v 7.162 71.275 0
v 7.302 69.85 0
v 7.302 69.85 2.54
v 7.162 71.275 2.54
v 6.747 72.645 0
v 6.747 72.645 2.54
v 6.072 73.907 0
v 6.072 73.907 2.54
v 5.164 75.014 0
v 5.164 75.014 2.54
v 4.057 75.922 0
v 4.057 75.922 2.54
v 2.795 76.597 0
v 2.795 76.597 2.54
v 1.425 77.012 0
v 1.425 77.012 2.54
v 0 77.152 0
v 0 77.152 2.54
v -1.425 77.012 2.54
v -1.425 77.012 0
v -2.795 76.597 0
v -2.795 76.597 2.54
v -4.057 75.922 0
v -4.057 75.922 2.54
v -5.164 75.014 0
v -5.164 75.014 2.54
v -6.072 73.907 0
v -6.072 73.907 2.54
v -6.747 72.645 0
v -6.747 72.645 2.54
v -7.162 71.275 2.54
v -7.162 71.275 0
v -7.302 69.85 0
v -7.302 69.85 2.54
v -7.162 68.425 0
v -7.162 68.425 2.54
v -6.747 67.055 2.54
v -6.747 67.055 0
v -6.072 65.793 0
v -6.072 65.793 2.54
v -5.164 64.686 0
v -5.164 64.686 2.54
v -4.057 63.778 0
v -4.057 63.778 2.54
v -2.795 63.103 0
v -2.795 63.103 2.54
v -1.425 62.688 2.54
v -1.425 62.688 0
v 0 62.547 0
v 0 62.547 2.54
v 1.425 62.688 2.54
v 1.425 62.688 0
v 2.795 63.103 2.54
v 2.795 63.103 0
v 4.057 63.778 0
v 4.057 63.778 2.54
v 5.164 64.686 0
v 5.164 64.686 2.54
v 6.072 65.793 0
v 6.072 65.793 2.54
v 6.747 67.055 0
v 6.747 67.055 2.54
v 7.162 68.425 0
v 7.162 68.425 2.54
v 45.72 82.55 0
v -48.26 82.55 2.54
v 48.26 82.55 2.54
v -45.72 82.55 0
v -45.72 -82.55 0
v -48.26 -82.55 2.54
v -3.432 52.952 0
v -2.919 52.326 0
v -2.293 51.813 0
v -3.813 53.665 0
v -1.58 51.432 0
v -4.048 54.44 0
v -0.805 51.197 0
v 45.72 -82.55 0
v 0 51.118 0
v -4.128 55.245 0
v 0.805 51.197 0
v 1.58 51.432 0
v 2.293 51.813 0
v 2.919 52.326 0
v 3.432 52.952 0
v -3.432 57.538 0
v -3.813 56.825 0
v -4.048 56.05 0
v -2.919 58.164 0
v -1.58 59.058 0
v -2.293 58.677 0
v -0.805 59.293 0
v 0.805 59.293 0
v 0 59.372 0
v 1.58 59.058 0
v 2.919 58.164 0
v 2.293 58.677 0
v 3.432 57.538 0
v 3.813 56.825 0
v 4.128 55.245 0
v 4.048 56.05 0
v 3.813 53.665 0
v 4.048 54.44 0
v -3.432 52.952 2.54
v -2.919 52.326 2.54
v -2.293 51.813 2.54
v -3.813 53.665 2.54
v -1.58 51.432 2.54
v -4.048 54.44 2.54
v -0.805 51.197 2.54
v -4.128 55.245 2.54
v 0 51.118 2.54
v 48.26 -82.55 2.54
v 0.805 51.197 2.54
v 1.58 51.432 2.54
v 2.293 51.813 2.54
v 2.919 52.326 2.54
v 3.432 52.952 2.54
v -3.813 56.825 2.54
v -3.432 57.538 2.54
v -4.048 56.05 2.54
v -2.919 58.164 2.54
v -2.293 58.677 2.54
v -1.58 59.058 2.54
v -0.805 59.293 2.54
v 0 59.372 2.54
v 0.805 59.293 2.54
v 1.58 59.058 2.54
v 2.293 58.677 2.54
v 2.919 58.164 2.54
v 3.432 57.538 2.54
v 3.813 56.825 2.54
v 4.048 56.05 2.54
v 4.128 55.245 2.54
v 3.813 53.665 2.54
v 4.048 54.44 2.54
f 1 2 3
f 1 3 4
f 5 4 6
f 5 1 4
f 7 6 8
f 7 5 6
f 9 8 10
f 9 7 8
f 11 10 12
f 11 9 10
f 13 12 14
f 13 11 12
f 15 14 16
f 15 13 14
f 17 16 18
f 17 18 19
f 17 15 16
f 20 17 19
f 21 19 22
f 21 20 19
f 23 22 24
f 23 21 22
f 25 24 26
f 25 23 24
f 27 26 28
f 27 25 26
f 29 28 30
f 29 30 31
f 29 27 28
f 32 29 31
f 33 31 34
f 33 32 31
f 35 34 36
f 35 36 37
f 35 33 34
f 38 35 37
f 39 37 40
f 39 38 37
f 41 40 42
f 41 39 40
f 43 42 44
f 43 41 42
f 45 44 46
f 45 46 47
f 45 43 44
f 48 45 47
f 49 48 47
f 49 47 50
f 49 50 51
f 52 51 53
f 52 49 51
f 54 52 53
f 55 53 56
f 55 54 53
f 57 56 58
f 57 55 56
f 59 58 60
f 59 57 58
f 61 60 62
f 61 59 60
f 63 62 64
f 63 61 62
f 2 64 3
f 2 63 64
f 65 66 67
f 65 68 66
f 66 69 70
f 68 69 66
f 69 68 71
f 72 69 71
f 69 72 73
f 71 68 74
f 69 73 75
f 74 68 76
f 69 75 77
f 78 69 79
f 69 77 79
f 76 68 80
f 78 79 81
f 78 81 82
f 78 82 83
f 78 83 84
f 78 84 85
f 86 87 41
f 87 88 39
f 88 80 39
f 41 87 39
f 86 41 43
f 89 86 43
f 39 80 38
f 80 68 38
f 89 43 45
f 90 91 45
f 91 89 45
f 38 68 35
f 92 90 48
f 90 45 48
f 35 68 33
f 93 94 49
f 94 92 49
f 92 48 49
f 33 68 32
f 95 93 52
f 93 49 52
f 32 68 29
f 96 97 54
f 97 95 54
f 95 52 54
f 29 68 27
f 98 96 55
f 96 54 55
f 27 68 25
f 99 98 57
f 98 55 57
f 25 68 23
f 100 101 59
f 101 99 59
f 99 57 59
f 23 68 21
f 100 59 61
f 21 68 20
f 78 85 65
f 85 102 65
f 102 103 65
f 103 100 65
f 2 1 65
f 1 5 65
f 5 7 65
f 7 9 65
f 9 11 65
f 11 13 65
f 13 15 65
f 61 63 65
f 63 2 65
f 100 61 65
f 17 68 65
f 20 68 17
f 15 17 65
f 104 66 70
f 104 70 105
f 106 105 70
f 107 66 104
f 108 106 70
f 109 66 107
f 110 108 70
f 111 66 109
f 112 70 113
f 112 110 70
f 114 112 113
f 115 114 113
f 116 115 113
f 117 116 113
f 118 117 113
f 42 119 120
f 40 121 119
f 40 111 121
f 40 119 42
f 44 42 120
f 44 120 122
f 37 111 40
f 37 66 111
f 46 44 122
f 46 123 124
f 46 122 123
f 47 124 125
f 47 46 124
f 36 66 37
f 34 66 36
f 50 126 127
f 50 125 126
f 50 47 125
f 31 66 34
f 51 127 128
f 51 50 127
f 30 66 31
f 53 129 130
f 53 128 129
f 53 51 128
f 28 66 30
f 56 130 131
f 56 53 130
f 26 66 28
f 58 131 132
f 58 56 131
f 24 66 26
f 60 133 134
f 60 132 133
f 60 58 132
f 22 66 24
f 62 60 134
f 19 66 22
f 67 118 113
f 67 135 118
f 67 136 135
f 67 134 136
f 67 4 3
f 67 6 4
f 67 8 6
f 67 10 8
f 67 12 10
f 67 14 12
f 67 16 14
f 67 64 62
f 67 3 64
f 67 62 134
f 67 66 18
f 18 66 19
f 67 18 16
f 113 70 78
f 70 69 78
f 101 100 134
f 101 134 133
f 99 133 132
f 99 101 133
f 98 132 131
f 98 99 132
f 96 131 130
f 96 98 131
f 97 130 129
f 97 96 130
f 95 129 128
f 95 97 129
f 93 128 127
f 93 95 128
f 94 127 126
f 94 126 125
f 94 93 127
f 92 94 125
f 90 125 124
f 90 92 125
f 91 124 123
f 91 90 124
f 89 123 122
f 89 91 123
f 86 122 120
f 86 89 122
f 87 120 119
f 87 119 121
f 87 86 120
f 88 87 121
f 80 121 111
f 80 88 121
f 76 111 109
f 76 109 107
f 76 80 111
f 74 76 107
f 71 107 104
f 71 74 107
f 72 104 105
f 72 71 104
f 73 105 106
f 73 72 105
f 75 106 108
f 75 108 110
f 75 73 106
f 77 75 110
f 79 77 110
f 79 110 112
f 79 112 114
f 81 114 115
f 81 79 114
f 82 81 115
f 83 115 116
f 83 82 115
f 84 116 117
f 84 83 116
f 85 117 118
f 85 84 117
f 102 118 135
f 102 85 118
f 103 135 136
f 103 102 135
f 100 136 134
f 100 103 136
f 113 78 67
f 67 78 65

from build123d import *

# Parameters (mm, degrees)
F0_W     = 96.52
F0_H     = 165.1
F0_R     = 4.1275
F0_R_2   = 7.3025
F1_DEPTH = 2.54
F2_SIZE  = 2.53999


# Not quite as in the source:
# - a fillet or chamfer is up to 0.001 mm smaller than in the source, because OpenCascade refuses the exact size


with BuildPart() as f1:
    # F0 (on Top) → F1 (new body)
    with BuildSketch(Plane.XY):
        Rectangle(F0_W, F0_H)
        with Locations((0, 55.245)):
            Circle(F0_R, mode=Mode.SUBTRACT)
        with Locations((0, 69.85)):
            Circle(F0_R_2, mode=Mode.SUBTRACT)
    extrude(amount=F1_DEPTH)

    # F2 (size 2.54 in the source; OpenCascade refuses exactly that, so slightly less here)
    f2_edges = [f1.edges().sort_by_distance(p)[0] for p in [
        (-48.26, 0, 0),
        (48.26, 0, 0),
    ]]
    chamfer(f2_edges, length=F2_SIZE)


solid = f1.part
